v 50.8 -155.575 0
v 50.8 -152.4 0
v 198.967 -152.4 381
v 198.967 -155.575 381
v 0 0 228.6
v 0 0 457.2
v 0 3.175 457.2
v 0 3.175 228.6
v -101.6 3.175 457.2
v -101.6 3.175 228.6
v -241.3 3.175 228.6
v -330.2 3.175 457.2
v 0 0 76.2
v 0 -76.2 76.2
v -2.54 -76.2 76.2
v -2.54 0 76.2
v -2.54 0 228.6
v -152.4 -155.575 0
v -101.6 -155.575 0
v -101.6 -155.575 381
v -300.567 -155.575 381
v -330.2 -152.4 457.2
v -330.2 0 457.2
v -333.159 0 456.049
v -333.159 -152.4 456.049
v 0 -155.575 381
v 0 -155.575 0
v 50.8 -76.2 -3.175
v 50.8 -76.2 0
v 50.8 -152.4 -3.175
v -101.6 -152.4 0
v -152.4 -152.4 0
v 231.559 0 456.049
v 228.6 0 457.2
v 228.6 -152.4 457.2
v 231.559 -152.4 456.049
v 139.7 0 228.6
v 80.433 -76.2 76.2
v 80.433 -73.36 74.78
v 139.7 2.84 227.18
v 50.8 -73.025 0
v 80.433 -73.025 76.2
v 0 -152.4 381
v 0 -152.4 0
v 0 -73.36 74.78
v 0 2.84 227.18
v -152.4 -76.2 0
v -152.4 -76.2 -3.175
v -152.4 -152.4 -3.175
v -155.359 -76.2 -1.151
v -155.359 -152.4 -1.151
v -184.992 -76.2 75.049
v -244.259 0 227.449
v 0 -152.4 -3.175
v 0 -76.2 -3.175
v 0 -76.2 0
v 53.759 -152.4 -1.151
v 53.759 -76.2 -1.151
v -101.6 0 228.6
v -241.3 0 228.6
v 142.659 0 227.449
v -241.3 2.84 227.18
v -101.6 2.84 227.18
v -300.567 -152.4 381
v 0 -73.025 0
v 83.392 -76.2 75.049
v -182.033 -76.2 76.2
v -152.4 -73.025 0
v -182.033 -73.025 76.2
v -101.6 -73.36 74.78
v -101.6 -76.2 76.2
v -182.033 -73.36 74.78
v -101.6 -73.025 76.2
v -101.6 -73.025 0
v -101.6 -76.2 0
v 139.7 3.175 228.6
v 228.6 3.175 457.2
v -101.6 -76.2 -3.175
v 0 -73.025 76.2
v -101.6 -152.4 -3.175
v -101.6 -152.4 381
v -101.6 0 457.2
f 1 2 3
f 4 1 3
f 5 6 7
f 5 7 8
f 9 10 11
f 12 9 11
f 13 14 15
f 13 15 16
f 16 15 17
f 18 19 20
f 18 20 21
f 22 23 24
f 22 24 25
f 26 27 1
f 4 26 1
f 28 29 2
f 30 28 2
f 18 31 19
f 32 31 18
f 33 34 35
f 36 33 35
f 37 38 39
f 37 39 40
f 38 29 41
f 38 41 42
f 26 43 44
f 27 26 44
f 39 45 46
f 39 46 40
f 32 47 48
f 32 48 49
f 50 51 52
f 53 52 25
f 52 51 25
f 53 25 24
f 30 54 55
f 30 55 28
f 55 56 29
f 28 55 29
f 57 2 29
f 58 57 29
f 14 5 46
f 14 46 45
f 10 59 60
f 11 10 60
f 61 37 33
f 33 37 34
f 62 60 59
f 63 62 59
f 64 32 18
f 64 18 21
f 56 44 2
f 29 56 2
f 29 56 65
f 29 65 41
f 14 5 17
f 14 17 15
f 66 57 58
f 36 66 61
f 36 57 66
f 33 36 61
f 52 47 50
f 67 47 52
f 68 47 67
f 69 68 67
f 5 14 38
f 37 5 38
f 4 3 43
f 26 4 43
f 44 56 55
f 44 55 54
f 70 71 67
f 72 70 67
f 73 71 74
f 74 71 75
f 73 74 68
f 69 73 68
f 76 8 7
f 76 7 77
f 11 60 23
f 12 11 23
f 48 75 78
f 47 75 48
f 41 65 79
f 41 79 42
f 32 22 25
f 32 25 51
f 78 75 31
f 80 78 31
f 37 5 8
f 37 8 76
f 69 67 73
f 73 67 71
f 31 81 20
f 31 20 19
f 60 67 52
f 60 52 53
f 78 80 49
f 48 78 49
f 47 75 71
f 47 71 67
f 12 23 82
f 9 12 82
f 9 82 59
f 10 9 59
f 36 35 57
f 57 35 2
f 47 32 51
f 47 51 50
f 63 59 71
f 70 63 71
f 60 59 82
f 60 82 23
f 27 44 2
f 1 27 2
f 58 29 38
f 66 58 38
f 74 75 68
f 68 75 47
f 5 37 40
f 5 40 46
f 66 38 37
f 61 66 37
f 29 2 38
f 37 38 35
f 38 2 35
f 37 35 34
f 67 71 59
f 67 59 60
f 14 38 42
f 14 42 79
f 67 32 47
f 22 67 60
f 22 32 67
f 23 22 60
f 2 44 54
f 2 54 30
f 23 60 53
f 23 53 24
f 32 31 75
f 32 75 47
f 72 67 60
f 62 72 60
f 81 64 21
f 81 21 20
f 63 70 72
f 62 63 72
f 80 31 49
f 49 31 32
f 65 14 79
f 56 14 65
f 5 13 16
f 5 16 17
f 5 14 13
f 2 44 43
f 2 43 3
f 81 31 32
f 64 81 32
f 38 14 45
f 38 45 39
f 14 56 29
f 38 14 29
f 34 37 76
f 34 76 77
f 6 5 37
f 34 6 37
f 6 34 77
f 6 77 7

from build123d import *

# Parameters (mm, degrees)
F6_DEPTH  = 2.54
F8_DEPTH  = 3.175
F9_DEPTH  = 3.175
F10_DEPTH = 3.175
F11_DEPTH = 3.175
F13_DEPTH = 3.175
F15_W     = 50.8
F15_H     = 76.2
F16_DEPTH = 3.175


# Not quite as in the source:
# - ends of sketch curves that miss each other by under 0.0002 mm in the source are joined


with BuildPart() as f6:
    # F5 (on Right) → F6 (new body)
    with BuildSketch(Plane.YZ):
        Polygon((-76.2, 76.2), (0, 76.2), (0, 228.6), align=None)
    extrude(amount=-F6_DEPTH)


with BuildPart() as f8:
    # F1 (on offset) → F8 (new body)
    with BuildSketch(Plane.XZ.offset(152.4)):
        Polygon((0, 381), (0, 0), (50.8, 0), (198.9666666121, 381), align=None)
    extrude(amount=F8_DEPTH)


with BuildPart() as f9:
    # F4 (on Front) → F9 (new body)
    with BuildSketch(Plane.XZ):
        Polygon((228.6, 457.2), (0, 457.2), (0, 228.6), (139.7000000328, 228.6), align=None)
    extrude(amount=-F9_DEPTH)


with BuildPart() as f10:
    # F3 (on offset) → F10 (new body)
    with BuildSketch(Plane.XZ.offset(76.2)):
        Polygon((0, 76.2), (0, 0), (50.8, 0), (80.4333333224, 76.2), align=None)
    extrude(amount=-F10_DEPTH)


with BuildPart() as f11:
    # F7 (on face) → F11 (new body)
    with BuildSketch(Plane(origin=(0, -91.44, 45.72), x_dir=(1, 0, 0), z_dir=(0, -0.894427191, 0.4472135955))):
        Polygon((0, 204.4660558626), (0, 34.0776759771), (80.4333418, 34.0776759771), (139.7, 204.4660558626), align=None)
    extrude(amount=-F11_DEPTH)


with BuildPart() as f13:
    # F12 (on face) → F13 (new body)
    with BuildSketch(Plane(origin=(44.1265415592, 0, -17.1603217112), x_dir=(0, 1, 0), z_dir=(0.9320046716, 0, -0.362446261))):
        Polygon((-152.4, 427.2085042593), (-152.4, 18.4122700608), (-76.2, 18.4122700608), (-76.2, 100.1715169005), (0, 263.6900105918), (0, 508.9677511228), (-152.4, 508.9677511228), align=None)
    extrude(amount=F13_DEPTH)


with BuildPart() as f16:
    # F15 (on face) → F16 (new body)
    with BuildSketch(Plane(origin=(0, 0, 0), x_dir=(1, 0, 0), z_dir=(0, 0, -1))):
        with Locations((25.4, 114.3)):
            Rectangle(F15_W, F15_H)
    extrude(amount=F16_DEPTH)


with BuildPart() as f17_1:
    # F17: instance of F9
    add(f9.part.mirror(Plane.YZ.offset(-50.8)))


with BuildPart() as f17_2:
    # F17: instance of F13
    add(f13.part.mirror(Plane.YZ.offset(-50.8)))


with BuildPart() as f17_3:
    # F17: instance of F8
    add(f8.part.mirror(Plane.YZ.offset(-50.8)))


with BuildPart() as f17_4:
    # F17: instance of F10
    add(f10.part.mirror(Plane.YZ.offset(-50.8)))


with BuildPart() as f17_5:
    # F17: instance of F16
    add(f16.part.mirror(Plane.YZ.offset(-50.8)))


with BuildPart() as f17_6:
    # F17: instance of F11
    add(f11.part.mirror(Plane.YZ.offset(-50.8)))


solid = Compound([f6.part, f8.part, f9.part, f10.part, f11.part, f13.part, f16.part, f17_1.part, f17_2.part, f17_3.part, f17_4.part, f17_5.part, f17_6.part])
